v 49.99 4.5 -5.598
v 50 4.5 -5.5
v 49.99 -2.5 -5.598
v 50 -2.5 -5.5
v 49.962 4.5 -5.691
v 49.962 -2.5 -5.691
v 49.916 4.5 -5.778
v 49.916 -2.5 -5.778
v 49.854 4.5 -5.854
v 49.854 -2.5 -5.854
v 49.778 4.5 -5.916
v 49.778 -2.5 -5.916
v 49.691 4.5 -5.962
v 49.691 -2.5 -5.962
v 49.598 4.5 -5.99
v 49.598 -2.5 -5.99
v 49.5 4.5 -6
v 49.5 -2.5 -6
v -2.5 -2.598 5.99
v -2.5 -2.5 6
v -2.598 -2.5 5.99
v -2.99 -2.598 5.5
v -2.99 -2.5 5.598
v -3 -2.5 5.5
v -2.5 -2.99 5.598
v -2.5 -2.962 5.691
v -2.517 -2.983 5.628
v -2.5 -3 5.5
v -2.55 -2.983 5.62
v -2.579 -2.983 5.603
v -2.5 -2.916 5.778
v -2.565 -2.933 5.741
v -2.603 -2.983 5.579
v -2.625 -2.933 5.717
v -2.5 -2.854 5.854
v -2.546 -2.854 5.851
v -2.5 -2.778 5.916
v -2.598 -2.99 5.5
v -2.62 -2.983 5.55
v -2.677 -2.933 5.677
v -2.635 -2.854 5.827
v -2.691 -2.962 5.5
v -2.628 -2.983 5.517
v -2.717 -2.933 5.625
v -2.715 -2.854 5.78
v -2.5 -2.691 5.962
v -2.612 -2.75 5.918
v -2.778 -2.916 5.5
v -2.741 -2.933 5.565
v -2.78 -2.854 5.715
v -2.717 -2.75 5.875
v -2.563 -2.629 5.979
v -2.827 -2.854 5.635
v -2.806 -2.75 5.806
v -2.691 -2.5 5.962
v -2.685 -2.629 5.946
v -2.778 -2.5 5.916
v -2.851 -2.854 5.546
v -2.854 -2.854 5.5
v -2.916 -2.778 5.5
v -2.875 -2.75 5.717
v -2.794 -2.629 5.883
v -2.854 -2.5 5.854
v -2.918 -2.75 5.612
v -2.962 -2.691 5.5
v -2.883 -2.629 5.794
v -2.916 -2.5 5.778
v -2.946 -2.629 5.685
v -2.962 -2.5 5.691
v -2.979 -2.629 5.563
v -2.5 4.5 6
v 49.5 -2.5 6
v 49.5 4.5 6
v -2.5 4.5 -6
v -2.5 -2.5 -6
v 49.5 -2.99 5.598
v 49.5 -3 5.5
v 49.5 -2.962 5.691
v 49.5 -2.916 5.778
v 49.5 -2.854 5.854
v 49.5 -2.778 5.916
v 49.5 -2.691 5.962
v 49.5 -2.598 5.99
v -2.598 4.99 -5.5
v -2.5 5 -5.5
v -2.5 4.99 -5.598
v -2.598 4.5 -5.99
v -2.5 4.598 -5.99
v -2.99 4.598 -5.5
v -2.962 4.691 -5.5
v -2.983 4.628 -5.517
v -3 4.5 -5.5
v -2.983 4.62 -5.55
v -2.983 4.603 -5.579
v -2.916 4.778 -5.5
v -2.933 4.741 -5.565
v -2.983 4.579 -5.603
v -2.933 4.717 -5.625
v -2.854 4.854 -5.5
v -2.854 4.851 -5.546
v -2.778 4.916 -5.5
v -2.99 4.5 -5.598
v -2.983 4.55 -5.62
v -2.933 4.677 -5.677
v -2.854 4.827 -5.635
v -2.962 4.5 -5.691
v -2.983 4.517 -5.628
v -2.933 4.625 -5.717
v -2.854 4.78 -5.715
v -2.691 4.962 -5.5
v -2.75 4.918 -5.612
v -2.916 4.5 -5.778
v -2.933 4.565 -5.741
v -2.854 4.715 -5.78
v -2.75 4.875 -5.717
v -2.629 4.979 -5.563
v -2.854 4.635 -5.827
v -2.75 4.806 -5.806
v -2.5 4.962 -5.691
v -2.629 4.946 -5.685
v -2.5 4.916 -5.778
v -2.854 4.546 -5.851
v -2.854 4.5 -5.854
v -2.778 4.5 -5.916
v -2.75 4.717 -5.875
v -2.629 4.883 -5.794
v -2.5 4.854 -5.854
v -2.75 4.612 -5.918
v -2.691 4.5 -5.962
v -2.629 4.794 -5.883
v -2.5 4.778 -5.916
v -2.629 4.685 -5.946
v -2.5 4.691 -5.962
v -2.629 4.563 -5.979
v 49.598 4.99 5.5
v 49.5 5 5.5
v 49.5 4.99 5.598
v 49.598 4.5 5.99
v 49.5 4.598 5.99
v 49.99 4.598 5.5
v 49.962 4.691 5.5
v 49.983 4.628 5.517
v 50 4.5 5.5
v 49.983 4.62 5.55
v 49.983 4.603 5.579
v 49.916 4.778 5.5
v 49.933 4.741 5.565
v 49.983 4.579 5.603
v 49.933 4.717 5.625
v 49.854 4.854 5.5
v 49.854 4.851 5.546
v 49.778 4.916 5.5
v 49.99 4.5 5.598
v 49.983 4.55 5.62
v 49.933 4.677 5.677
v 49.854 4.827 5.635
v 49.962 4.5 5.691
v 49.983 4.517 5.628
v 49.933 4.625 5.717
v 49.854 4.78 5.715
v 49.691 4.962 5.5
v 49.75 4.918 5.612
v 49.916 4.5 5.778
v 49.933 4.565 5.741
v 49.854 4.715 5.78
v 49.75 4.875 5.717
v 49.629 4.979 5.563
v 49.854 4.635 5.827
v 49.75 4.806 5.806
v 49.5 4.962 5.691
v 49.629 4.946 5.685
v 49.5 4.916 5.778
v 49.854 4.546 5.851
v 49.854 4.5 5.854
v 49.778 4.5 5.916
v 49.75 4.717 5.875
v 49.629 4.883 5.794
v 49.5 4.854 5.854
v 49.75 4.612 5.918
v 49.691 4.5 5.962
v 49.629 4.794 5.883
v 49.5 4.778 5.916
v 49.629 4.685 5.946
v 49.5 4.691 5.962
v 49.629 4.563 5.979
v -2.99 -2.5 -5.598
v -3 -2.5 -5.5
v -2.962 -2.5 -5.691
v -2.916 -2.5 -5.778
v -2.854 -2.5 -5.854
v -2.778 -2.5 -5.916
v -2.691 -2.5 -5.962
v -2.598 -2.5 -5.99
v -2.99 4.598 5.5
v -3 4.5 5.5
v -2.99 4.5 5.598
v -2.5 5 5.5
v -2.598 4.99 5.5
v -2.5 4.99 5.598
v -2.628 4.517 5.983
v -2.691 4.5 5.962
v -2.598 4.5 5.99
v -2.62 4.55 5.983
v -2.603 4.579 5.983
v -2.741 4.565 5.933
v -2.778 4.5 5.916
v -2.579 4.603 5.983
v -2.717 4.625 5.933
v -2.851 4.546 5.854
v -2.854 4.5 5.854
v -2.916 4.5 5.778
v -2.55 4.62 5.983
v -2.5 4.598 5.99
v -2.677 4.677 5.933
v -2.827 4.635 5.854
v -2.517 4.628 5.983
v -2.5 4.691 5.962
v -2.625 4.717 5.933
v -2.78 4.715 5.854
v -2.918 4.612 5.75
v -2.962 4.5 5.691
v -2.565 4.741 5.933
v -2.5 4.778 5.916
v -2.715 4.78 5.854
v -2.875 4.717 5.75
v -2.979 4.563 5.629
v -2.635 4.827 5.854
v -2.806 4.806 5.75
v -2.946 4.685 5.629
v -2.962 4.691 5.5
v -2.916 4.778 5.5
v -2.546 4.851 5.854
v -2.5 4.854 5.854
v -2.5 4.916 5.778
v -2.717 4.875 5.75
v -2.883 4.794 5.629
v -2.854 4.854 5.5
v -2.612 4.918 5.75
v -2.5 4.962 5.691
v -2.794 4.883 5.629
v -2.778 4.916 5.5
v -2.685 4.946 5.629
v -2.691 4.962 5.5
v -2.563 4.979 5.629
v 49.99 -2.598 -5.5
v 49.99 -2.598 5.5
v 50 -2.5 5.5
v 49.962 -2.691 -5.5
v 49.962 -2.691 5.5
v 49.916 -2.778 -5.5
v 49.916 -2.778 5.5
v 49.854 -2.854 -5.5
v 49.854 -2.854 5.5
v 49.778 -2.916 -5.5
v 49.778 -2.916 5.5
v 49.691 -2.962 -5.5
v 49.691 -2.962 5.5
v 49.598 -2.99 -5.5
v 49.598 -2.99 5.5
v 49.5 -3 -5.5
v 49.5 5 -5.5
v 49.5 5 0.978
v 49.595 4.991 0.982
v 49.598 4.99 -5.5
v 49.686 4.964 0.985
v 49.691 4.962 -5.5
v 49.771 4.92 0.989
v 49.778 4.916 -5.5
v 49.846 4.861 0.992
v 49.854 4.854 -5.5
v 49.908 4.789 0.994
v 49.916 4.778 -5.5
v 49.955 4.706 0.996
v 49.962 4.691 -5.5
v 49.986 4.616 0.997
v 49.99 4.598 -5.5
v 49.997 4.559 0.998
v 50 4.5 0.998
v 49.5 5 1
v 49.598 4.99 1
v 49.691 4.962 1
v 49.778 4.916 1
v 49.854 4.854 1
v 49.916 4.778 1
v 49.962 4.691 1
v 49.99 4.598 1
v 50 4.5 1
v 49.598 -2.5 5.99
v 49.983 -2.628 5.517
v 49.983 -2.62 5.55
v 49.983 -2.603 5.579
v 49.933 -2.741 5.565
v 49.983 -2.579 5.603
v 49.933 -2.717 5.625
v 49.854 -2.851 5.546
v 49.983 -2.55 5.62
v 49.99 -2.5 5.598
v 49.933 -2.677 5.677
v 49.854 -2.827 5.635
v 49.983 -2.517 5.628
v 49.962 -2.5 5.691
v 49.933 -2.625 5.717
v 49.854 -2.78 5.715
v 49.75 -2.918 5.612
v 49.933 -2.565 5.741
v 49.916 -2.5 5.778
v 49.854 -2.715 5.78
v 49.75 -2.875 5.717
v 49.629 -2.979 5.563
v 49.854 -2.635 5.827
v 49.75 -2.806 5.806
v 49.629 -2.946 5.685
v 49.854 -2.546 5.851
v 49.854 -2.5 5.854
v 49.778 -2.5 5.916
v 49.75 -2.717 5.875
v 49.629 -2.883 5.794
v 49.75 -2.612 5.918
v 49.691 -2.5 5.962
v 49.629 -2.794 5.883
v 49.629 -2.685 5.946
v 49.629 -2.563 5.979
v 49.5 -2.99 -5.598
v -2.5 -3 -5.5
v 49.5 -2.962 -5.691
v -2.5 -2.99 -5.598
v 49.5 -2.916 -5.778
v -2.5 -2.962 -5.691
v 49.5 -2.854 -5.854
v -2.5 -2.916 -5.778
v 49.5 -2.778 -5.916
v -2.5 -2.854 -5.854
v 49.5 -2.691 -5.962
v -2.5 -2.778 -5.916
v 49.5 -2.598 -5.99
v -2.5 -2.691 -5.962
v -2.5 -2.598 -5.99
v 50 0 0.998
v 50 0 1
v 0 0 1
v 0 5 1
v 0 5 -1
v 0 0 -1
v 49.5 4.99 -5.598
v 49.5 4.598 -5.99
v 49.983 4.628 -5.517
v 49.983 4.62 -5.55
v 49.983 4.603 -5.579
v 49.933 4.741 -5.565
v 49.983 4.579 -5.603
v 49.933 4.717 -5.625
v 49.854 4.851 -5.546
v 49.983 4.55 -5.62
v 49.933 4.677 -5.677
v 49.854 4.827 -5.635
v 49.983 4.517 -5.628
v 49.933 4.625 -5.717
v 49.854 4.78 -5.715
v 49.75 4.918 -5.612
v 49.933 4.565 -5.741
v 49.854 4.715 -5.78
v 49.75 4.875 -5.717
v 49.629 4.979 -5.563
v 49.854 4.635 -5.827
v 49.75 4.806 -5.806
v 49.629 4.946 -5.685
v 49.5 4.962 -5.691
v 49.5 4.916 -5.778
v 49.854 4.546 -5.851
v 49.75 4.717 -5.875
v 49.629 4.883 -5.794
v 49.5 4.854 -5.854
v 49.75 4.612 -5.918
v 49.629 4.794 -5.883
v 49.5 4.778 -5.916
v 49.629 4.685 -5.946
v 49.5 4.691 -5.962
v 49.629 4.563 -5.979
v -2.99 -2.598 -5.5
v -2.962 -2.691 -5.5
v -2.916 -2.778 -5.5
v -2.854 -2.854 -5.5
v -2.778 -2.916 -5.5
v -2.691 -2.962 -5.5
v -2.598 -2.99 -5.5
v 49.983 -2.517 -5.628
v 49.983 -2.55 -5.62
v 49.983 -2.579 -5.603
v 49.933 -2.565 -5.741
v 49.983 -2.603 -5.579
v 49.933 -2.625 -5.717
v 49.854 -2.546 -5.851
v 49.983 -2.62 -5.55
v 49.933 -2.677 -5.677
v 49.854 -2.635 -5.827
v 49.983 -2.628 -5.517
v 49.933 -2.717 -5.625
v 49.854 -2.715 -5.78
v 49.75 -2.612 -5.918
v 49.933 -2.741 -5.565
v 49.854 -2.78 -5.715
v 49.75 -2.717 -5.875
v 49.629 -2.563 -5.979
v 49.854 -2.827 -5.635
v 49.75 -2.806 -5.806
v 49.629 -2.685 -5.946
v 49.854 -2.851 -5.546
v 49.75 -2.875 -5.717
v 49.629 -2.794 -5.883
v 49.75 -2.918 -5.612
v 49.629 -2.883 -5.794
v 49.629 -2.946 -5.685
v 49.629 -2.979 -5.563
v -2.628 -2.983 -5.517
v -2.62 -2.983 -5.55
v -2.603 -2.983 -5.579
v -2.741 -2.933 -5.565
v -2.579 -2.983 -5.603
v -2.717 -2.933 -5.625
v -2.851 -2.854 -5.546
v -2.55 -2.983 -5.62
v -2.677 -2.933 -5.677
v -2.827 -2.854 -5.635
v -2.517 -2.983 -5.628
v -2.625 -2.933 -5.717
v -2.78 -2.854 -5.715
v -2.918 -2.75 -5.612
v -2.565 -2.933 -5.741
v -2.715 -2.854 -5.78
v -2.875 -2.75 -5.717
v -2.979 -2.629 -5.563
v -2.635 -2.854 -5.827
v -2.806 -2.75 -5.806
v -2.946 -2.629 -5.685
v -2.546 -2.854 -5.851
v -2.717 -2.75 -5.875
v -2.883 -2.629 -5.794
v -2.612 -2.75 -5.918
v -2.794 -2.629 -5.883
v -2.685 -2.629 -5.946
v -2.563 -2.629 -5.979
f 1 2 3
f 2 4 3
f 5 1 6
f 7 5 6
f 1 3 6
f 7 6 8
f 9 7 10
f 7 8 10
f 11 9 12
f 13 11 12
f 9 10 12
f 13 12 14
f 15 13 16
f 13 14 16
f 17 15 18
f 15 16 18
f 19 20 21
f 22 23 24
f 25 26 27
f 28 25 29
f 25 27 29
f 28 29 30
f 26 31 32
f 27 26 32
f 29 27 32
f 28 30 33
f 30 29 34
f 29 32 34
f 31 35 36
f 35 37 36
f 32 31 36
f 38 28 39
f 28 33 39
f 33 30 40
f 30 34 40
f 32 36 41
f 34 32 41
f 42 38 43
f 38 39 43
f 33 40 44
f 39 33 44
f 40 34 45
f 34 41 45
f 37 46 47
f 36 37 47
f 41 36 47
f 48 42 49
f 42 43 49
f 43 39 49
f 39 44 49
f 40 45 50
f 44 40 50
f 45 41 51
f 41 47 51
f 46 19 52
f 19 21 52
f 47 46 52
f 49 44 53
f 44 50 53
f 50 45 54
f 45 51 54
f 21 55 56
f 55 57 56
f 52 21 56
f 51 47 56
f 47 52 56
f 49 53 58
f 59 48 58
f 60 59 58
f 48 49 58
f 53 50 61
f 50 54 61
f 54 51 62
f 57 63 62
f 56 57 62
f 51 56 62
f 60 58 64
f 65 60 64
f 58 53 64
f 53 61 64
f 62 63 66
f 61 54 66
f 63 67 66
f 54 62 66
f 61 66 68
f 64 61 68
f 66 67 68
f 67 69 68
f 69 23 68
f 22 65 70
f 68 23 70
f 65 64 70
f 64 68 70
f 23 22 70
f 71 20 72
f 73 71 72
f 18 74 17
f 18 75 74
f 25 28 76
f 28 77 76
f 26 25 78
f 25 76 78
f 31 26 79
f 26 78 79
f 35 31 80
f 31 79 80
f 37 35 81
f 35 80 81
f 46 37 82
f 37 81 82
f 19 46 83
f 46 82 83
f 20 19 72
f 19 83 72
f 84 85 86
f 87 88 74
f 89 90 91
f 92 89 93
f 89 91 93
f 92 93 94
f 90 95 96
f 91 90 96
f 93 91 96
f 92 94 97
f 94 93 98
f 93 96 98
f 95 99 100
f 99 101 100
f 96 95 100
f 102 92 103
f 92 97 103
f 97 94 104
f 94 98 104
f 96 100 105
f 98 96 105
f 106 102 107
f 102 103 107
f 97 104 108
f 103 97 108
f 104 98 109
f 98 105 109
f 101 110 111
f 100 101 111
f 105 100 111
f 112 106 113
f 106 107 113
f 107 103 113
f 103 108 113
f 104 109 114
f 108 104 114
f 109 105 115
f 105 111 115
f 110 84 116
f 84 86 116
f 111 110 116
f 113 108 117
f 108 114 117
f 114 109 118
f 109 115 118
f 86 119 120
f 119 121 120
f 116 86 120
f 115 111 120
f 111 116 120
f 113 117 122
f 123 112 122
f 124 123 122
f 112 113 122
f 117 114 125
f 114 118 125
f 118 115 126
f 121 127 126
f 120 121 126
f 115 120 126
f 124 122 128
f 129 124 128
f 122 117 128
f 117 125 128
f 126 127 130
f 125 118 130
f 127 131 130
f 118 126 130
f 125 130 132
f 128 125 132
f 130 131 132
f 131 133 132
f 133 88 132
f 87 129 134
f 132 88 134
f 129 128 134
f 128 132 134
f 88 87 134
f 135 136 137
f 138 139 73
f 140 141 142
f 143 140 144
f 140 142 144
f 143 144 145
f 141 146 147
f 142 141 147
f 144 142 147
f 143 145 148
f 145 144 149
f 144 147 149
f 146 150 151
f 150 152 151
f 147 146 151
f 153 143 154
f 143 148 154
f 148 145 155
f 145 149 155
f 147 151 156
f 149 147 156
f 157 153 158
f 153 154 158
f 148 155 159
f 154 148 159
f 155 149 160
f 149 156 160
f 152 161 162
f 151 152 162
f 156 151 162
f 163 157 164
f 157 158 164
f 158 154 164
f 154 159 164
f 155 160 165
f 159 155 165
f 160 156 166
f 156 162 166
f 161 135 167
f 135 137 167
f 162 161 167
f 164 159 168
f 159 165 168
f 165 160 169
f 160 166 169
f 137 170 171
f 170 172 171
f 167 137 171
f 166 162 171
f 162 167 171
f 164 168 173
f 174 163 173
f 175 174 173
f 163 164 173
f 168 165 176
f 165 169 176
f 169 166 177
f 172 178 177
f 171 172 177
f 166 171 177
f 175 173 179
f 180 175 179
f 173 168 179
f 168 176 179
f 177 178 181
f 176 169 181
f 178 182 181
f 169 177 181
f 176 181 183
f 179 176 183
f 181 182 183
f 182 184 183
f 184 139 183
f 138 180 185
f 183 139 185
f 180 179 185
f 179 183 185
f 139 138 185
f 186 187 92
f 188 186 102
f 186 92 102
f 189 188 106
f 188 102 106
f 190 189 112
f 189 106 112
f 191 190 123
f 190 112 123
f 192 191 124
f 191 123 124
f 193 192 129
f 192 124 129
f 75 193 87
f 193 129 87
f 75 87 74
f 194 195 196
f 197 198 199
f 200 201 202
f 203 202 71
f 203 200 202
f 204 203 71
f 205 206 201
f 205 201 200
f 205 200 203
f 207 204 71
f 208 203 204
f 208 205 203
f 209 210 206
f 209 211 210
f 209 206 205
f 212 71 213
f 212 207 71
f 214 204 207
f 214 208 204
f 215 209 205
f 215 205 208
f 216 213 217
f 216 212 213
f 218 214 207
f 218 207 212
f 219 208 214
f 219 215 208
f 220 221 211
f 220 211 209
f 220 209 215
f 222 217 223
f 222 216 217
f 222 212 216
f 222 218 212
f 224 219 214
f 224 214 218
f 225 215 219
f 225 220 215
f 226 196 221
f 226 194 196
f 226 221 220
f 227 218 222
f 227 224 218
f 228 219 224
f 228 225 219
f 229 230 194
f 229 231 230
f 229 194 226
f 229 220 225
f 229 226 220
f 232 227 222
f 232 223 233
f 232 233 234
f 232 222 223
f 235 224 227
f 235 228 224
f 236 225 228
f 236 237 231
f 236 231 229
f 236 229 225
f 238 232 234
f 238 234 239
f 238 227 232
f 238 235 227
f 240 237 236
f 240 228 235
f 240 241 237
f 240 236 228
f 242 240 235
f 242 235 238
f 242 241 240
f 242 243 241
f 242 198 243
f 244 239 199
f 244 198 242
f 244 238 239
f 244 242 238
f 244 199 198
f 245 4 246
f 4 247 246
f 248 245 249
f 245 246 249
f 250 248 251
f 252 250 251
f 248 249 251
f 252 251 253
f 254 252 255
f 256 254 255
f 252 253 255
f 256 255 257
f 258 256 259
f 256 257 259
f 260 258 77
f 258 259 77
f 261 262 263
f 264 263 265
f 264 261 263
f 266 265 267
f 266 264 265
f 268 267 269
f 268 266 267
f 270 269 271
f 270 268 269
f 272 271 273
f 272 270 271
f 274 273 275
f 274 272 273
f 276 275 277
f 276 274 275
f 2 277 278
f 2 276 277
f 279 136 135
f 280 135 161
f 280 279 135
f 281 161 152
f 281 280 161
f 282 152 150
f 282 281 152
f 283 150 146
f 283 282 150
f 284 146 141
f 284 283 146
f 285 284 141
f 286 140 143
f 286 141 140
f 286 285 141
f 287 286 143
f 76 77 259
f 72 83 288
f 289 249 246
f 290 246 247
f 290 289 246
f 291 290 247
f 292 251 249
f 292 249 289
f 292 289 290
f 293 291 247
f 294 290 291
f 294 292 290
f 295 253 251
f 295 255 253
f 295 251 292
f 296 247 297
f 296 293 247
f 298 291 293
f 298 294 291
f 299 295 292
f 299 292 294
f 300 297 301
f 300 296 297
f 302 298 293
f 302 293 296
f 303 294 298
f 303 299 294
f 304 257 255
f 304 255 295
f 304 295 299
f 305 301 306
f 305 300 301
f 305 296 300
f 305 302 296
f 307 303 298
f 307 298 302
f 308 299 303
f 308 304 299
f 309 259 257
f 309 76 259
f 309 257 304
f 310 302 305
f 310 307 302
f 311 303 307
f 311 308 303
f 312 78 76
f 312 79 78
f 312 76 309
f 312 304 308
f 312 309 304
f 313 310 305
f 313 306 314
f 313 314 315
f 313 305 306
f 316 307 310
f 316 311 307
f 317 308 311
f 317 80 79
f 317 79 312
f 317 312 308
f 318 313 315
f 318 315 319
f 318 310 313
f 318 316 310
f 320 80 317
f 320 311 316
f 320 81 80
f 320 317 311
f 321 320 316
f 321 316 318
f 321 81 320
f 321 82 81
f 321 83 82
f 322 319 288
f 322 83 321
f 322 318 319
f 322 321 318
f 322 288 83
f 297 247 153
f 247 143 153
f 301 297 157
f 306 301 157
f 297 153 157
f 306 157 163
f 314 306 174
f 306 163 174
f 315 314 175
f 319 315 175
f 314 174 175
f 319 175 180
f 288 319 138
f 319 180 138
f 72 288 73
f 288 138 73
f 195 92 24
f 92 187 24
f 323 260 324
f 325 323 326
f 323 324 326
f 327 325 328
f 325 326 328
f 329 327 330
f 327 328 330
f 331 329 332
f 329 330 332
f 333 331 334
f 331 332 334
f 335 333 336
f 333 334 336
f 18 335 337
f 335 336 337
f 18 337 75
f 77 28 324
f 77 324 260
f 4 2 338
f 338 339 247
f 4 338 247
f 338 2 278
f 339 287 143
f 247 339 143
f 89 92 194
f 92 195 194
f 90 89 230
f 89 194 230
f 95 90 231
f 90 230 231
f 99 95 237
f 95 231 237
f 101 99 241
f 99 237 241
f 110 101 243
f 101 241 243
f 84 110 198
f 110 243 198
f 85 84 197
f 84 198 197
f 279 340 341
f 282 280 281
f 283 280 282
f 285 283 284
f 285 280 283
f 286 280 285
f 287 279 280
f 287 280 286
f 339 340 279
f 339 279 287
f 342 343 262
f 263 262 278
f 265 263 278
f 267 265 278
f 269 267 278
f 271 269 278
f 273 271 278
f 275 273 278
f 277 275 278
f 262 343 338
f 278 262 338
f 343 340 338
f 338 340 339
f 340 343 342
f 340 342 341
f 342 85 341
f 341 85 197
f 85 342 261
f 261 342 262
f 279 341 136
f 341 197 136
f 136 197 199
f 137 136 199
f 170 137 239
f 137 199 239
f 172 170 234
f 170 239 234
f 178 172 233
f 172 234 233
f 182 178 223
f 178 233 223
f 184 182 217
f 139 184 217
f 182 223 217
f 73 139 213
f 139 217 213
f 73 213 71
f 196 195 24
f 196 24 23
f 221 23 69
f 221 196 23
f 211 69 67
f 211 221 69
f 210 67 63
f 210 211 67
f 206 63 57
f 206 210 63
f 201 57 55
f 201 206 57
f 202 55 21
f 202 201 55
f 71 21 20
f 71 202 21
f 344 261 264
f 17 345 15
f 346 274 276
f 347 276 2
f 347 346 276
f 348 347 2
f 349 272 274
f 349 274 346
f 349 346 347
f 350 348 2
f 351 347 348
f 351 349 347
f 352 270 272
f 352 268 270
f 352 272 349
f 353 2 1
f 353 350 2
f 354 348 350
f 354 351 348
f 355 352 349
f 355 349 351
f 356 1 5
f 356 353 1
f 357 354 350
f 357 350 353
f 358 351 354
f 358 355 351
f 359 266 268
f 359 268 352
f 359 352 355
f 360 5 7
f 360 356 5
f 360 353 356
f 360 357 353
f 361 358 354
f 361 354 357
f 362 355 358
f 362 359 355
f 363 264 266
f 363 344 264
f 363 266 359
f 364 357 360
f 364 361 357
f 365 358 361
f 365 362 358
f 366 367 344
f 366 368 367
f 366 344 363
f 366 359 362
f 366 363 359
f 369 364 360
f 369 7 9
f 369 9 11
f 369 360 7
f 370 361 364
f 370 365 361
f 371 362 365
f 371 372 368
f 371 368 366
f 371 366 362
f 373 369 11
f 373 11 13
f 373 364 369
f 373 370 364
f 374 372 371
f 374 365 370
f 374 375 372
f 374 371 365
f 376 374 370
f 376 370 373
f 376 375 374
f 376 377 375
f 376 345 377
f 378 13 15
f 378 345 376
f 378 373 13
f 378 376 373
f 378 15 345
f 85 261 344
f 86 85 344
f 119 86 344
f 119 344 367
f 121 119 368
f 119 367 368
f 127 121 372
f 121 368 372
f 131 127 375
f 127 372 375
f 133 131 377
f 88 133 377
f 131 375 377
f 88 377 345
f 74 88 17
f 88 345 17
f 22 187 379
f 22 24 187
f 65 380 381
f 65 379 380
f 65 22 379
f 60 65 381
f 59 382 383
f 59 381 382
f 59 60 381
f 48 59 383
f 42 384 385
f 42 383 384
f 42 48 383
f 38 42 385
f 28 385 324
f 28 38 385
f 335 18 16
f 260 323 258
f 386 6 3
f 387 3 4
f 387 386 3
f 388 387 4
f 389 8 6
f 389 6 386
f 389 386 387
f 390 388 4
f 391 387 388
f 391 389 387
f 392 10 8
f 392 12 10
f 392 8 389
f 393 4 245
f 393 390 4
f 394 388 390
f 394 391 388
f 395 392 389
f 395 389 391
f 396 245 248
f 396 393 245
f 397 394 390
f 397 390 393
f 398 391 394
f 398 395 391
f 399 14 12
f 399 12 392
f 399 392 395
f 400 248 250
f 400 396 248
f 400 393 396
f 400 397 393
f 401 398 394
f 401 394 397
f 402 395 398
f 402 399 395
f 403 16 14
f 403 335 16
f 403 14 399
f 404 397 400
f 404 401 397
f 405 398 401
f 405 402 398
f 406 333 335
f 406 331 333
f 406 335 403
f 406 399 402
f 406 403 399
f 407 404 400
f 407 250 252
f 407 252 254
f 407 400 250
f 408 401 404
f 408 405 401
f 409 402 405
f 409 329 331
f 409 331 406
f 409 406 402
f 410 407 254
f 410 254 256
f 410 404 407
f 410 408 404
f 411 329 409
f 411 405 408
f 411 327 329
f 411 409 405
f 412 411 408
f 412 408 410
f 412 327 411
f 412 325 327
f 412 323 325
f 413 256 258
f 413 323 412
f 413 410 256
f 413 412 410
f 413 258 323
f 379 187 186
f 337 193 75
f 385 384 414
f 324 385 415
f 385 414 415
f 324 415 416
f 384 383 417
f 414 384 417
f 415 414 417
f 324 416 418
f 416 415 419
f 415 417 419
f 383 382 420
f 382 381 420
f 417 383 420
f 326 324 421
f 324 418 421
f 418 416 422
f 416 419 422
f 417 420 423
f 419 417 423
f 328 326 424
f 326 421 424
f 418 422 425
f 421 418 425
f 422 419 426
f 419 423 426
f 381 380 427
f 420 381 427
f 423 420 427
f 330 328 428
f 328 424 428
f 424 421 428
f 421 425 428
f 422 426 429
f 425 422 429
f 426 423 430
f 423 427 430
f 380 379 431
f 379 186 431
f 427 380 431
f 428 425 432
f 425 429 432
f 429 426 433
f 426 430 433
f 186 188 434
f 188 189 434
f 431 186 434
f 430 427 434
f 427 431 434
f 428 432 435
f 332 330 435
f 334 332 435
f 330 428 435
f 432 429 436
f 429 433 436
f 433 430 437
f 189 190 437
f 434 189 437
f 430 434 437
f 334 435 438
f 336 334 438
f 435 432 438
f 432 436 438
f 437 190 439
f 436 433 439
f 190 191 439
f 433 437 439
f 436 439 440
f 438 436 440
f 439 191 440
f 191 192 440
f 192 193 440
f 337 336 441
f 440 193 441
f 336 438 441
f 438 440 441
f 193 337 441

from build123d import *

# Parameters (mm, degrees)
SKETCH1_W             = 50
SKETCH1_H             = 5
BOSS_EXTRUDE1_DEPTH   = 5
BOSS_EXTRUDE1_2_DEPTH = 5
SKETCH2_W             = 50
SKETCH2_H             = 12
BOSS_EXTRUDE2_DEPTH   = 3
SKETCH3_W             = 3
SKETCH3_H             = 12
BOSS_EXTRUDE3_DEPTH   = 8
FILLET1_R             = 0.5


with BuildPart() as part:
    # Sketch1 → Boss-Extrude1 (new body)
    with BuildSketch(Plane(origin=(0, 0, 0), x_dir=(1, 0, 0), z_dir=(0, 1, 0))):
        with Locations((25, -3.5)):
            Rectangle(SKETCH1_W, SKETCH1_H)
    extrude(amount=BOSS_EXTRUDE1_DEPTH)



with BuildPart() as body_2:
    # Sketch1 → Boss-Extrude1 2 (new body)
    with BuildSketch(Plane(origin=(0, 0, 0), x_dir=(1, 0, 0), z_dir=(0, 1, 0))):
        Polygon((0, 6), (0, 1), (50, -0.998001998), (50, 6), align=None)
    extrude(amount=BOSS_EXTRUDE1_2_DEPTH)


with BuildPart() as body_3:
    # Sketch2 → Boss-Extrude2 (new body)
    with BuildSketch(Plane.XZ):
        with Locations((25, 0)):
            Rectangle(SKETCH2_W, SKETCH2_H)
    extrude(amount=BOSS_EXTRUDE2_DEPTH)


with BuildPart() as part_1:
    add(part.part)

    add(body_2.part)  # Boss-Extrude3 merges body 2

    add(body_3.part)  # Boss-Extrude3 merges body 3
    # Sketch3 → Boss-Extrude3 (add)
    with BuildSketch(Plane.XZ.offset(3)):
        with Locations((-1.5, 0)):
            Rectangle(SKETCH3_W, SKETCH3_H)
    extrude(amount=-BOSS_EXTRUDE3_DEPTH)

    # Fillet1
    fillet1_edges = [part_1.edges().sort_by_distance(p)[0] for p in [
        (23.5, 5, -6),
        (-3, 5, 0),
        (-3, 1, -6),
        (-3, 1, 6),
        (23.5, -3, 6),
        (-3, -3, 0),
        (23.5, -3, -6),
        (23.5, 5, 6),
        (50, 5, -2.500999001),
        (50, 1, -6),
        (50, -3, 0),
        (50, 5, 3.5),
        (50, 1, 6),
    ]]
    fillet(fillet1_edges, radius=FILLET1_R)


solid = part_1.part
